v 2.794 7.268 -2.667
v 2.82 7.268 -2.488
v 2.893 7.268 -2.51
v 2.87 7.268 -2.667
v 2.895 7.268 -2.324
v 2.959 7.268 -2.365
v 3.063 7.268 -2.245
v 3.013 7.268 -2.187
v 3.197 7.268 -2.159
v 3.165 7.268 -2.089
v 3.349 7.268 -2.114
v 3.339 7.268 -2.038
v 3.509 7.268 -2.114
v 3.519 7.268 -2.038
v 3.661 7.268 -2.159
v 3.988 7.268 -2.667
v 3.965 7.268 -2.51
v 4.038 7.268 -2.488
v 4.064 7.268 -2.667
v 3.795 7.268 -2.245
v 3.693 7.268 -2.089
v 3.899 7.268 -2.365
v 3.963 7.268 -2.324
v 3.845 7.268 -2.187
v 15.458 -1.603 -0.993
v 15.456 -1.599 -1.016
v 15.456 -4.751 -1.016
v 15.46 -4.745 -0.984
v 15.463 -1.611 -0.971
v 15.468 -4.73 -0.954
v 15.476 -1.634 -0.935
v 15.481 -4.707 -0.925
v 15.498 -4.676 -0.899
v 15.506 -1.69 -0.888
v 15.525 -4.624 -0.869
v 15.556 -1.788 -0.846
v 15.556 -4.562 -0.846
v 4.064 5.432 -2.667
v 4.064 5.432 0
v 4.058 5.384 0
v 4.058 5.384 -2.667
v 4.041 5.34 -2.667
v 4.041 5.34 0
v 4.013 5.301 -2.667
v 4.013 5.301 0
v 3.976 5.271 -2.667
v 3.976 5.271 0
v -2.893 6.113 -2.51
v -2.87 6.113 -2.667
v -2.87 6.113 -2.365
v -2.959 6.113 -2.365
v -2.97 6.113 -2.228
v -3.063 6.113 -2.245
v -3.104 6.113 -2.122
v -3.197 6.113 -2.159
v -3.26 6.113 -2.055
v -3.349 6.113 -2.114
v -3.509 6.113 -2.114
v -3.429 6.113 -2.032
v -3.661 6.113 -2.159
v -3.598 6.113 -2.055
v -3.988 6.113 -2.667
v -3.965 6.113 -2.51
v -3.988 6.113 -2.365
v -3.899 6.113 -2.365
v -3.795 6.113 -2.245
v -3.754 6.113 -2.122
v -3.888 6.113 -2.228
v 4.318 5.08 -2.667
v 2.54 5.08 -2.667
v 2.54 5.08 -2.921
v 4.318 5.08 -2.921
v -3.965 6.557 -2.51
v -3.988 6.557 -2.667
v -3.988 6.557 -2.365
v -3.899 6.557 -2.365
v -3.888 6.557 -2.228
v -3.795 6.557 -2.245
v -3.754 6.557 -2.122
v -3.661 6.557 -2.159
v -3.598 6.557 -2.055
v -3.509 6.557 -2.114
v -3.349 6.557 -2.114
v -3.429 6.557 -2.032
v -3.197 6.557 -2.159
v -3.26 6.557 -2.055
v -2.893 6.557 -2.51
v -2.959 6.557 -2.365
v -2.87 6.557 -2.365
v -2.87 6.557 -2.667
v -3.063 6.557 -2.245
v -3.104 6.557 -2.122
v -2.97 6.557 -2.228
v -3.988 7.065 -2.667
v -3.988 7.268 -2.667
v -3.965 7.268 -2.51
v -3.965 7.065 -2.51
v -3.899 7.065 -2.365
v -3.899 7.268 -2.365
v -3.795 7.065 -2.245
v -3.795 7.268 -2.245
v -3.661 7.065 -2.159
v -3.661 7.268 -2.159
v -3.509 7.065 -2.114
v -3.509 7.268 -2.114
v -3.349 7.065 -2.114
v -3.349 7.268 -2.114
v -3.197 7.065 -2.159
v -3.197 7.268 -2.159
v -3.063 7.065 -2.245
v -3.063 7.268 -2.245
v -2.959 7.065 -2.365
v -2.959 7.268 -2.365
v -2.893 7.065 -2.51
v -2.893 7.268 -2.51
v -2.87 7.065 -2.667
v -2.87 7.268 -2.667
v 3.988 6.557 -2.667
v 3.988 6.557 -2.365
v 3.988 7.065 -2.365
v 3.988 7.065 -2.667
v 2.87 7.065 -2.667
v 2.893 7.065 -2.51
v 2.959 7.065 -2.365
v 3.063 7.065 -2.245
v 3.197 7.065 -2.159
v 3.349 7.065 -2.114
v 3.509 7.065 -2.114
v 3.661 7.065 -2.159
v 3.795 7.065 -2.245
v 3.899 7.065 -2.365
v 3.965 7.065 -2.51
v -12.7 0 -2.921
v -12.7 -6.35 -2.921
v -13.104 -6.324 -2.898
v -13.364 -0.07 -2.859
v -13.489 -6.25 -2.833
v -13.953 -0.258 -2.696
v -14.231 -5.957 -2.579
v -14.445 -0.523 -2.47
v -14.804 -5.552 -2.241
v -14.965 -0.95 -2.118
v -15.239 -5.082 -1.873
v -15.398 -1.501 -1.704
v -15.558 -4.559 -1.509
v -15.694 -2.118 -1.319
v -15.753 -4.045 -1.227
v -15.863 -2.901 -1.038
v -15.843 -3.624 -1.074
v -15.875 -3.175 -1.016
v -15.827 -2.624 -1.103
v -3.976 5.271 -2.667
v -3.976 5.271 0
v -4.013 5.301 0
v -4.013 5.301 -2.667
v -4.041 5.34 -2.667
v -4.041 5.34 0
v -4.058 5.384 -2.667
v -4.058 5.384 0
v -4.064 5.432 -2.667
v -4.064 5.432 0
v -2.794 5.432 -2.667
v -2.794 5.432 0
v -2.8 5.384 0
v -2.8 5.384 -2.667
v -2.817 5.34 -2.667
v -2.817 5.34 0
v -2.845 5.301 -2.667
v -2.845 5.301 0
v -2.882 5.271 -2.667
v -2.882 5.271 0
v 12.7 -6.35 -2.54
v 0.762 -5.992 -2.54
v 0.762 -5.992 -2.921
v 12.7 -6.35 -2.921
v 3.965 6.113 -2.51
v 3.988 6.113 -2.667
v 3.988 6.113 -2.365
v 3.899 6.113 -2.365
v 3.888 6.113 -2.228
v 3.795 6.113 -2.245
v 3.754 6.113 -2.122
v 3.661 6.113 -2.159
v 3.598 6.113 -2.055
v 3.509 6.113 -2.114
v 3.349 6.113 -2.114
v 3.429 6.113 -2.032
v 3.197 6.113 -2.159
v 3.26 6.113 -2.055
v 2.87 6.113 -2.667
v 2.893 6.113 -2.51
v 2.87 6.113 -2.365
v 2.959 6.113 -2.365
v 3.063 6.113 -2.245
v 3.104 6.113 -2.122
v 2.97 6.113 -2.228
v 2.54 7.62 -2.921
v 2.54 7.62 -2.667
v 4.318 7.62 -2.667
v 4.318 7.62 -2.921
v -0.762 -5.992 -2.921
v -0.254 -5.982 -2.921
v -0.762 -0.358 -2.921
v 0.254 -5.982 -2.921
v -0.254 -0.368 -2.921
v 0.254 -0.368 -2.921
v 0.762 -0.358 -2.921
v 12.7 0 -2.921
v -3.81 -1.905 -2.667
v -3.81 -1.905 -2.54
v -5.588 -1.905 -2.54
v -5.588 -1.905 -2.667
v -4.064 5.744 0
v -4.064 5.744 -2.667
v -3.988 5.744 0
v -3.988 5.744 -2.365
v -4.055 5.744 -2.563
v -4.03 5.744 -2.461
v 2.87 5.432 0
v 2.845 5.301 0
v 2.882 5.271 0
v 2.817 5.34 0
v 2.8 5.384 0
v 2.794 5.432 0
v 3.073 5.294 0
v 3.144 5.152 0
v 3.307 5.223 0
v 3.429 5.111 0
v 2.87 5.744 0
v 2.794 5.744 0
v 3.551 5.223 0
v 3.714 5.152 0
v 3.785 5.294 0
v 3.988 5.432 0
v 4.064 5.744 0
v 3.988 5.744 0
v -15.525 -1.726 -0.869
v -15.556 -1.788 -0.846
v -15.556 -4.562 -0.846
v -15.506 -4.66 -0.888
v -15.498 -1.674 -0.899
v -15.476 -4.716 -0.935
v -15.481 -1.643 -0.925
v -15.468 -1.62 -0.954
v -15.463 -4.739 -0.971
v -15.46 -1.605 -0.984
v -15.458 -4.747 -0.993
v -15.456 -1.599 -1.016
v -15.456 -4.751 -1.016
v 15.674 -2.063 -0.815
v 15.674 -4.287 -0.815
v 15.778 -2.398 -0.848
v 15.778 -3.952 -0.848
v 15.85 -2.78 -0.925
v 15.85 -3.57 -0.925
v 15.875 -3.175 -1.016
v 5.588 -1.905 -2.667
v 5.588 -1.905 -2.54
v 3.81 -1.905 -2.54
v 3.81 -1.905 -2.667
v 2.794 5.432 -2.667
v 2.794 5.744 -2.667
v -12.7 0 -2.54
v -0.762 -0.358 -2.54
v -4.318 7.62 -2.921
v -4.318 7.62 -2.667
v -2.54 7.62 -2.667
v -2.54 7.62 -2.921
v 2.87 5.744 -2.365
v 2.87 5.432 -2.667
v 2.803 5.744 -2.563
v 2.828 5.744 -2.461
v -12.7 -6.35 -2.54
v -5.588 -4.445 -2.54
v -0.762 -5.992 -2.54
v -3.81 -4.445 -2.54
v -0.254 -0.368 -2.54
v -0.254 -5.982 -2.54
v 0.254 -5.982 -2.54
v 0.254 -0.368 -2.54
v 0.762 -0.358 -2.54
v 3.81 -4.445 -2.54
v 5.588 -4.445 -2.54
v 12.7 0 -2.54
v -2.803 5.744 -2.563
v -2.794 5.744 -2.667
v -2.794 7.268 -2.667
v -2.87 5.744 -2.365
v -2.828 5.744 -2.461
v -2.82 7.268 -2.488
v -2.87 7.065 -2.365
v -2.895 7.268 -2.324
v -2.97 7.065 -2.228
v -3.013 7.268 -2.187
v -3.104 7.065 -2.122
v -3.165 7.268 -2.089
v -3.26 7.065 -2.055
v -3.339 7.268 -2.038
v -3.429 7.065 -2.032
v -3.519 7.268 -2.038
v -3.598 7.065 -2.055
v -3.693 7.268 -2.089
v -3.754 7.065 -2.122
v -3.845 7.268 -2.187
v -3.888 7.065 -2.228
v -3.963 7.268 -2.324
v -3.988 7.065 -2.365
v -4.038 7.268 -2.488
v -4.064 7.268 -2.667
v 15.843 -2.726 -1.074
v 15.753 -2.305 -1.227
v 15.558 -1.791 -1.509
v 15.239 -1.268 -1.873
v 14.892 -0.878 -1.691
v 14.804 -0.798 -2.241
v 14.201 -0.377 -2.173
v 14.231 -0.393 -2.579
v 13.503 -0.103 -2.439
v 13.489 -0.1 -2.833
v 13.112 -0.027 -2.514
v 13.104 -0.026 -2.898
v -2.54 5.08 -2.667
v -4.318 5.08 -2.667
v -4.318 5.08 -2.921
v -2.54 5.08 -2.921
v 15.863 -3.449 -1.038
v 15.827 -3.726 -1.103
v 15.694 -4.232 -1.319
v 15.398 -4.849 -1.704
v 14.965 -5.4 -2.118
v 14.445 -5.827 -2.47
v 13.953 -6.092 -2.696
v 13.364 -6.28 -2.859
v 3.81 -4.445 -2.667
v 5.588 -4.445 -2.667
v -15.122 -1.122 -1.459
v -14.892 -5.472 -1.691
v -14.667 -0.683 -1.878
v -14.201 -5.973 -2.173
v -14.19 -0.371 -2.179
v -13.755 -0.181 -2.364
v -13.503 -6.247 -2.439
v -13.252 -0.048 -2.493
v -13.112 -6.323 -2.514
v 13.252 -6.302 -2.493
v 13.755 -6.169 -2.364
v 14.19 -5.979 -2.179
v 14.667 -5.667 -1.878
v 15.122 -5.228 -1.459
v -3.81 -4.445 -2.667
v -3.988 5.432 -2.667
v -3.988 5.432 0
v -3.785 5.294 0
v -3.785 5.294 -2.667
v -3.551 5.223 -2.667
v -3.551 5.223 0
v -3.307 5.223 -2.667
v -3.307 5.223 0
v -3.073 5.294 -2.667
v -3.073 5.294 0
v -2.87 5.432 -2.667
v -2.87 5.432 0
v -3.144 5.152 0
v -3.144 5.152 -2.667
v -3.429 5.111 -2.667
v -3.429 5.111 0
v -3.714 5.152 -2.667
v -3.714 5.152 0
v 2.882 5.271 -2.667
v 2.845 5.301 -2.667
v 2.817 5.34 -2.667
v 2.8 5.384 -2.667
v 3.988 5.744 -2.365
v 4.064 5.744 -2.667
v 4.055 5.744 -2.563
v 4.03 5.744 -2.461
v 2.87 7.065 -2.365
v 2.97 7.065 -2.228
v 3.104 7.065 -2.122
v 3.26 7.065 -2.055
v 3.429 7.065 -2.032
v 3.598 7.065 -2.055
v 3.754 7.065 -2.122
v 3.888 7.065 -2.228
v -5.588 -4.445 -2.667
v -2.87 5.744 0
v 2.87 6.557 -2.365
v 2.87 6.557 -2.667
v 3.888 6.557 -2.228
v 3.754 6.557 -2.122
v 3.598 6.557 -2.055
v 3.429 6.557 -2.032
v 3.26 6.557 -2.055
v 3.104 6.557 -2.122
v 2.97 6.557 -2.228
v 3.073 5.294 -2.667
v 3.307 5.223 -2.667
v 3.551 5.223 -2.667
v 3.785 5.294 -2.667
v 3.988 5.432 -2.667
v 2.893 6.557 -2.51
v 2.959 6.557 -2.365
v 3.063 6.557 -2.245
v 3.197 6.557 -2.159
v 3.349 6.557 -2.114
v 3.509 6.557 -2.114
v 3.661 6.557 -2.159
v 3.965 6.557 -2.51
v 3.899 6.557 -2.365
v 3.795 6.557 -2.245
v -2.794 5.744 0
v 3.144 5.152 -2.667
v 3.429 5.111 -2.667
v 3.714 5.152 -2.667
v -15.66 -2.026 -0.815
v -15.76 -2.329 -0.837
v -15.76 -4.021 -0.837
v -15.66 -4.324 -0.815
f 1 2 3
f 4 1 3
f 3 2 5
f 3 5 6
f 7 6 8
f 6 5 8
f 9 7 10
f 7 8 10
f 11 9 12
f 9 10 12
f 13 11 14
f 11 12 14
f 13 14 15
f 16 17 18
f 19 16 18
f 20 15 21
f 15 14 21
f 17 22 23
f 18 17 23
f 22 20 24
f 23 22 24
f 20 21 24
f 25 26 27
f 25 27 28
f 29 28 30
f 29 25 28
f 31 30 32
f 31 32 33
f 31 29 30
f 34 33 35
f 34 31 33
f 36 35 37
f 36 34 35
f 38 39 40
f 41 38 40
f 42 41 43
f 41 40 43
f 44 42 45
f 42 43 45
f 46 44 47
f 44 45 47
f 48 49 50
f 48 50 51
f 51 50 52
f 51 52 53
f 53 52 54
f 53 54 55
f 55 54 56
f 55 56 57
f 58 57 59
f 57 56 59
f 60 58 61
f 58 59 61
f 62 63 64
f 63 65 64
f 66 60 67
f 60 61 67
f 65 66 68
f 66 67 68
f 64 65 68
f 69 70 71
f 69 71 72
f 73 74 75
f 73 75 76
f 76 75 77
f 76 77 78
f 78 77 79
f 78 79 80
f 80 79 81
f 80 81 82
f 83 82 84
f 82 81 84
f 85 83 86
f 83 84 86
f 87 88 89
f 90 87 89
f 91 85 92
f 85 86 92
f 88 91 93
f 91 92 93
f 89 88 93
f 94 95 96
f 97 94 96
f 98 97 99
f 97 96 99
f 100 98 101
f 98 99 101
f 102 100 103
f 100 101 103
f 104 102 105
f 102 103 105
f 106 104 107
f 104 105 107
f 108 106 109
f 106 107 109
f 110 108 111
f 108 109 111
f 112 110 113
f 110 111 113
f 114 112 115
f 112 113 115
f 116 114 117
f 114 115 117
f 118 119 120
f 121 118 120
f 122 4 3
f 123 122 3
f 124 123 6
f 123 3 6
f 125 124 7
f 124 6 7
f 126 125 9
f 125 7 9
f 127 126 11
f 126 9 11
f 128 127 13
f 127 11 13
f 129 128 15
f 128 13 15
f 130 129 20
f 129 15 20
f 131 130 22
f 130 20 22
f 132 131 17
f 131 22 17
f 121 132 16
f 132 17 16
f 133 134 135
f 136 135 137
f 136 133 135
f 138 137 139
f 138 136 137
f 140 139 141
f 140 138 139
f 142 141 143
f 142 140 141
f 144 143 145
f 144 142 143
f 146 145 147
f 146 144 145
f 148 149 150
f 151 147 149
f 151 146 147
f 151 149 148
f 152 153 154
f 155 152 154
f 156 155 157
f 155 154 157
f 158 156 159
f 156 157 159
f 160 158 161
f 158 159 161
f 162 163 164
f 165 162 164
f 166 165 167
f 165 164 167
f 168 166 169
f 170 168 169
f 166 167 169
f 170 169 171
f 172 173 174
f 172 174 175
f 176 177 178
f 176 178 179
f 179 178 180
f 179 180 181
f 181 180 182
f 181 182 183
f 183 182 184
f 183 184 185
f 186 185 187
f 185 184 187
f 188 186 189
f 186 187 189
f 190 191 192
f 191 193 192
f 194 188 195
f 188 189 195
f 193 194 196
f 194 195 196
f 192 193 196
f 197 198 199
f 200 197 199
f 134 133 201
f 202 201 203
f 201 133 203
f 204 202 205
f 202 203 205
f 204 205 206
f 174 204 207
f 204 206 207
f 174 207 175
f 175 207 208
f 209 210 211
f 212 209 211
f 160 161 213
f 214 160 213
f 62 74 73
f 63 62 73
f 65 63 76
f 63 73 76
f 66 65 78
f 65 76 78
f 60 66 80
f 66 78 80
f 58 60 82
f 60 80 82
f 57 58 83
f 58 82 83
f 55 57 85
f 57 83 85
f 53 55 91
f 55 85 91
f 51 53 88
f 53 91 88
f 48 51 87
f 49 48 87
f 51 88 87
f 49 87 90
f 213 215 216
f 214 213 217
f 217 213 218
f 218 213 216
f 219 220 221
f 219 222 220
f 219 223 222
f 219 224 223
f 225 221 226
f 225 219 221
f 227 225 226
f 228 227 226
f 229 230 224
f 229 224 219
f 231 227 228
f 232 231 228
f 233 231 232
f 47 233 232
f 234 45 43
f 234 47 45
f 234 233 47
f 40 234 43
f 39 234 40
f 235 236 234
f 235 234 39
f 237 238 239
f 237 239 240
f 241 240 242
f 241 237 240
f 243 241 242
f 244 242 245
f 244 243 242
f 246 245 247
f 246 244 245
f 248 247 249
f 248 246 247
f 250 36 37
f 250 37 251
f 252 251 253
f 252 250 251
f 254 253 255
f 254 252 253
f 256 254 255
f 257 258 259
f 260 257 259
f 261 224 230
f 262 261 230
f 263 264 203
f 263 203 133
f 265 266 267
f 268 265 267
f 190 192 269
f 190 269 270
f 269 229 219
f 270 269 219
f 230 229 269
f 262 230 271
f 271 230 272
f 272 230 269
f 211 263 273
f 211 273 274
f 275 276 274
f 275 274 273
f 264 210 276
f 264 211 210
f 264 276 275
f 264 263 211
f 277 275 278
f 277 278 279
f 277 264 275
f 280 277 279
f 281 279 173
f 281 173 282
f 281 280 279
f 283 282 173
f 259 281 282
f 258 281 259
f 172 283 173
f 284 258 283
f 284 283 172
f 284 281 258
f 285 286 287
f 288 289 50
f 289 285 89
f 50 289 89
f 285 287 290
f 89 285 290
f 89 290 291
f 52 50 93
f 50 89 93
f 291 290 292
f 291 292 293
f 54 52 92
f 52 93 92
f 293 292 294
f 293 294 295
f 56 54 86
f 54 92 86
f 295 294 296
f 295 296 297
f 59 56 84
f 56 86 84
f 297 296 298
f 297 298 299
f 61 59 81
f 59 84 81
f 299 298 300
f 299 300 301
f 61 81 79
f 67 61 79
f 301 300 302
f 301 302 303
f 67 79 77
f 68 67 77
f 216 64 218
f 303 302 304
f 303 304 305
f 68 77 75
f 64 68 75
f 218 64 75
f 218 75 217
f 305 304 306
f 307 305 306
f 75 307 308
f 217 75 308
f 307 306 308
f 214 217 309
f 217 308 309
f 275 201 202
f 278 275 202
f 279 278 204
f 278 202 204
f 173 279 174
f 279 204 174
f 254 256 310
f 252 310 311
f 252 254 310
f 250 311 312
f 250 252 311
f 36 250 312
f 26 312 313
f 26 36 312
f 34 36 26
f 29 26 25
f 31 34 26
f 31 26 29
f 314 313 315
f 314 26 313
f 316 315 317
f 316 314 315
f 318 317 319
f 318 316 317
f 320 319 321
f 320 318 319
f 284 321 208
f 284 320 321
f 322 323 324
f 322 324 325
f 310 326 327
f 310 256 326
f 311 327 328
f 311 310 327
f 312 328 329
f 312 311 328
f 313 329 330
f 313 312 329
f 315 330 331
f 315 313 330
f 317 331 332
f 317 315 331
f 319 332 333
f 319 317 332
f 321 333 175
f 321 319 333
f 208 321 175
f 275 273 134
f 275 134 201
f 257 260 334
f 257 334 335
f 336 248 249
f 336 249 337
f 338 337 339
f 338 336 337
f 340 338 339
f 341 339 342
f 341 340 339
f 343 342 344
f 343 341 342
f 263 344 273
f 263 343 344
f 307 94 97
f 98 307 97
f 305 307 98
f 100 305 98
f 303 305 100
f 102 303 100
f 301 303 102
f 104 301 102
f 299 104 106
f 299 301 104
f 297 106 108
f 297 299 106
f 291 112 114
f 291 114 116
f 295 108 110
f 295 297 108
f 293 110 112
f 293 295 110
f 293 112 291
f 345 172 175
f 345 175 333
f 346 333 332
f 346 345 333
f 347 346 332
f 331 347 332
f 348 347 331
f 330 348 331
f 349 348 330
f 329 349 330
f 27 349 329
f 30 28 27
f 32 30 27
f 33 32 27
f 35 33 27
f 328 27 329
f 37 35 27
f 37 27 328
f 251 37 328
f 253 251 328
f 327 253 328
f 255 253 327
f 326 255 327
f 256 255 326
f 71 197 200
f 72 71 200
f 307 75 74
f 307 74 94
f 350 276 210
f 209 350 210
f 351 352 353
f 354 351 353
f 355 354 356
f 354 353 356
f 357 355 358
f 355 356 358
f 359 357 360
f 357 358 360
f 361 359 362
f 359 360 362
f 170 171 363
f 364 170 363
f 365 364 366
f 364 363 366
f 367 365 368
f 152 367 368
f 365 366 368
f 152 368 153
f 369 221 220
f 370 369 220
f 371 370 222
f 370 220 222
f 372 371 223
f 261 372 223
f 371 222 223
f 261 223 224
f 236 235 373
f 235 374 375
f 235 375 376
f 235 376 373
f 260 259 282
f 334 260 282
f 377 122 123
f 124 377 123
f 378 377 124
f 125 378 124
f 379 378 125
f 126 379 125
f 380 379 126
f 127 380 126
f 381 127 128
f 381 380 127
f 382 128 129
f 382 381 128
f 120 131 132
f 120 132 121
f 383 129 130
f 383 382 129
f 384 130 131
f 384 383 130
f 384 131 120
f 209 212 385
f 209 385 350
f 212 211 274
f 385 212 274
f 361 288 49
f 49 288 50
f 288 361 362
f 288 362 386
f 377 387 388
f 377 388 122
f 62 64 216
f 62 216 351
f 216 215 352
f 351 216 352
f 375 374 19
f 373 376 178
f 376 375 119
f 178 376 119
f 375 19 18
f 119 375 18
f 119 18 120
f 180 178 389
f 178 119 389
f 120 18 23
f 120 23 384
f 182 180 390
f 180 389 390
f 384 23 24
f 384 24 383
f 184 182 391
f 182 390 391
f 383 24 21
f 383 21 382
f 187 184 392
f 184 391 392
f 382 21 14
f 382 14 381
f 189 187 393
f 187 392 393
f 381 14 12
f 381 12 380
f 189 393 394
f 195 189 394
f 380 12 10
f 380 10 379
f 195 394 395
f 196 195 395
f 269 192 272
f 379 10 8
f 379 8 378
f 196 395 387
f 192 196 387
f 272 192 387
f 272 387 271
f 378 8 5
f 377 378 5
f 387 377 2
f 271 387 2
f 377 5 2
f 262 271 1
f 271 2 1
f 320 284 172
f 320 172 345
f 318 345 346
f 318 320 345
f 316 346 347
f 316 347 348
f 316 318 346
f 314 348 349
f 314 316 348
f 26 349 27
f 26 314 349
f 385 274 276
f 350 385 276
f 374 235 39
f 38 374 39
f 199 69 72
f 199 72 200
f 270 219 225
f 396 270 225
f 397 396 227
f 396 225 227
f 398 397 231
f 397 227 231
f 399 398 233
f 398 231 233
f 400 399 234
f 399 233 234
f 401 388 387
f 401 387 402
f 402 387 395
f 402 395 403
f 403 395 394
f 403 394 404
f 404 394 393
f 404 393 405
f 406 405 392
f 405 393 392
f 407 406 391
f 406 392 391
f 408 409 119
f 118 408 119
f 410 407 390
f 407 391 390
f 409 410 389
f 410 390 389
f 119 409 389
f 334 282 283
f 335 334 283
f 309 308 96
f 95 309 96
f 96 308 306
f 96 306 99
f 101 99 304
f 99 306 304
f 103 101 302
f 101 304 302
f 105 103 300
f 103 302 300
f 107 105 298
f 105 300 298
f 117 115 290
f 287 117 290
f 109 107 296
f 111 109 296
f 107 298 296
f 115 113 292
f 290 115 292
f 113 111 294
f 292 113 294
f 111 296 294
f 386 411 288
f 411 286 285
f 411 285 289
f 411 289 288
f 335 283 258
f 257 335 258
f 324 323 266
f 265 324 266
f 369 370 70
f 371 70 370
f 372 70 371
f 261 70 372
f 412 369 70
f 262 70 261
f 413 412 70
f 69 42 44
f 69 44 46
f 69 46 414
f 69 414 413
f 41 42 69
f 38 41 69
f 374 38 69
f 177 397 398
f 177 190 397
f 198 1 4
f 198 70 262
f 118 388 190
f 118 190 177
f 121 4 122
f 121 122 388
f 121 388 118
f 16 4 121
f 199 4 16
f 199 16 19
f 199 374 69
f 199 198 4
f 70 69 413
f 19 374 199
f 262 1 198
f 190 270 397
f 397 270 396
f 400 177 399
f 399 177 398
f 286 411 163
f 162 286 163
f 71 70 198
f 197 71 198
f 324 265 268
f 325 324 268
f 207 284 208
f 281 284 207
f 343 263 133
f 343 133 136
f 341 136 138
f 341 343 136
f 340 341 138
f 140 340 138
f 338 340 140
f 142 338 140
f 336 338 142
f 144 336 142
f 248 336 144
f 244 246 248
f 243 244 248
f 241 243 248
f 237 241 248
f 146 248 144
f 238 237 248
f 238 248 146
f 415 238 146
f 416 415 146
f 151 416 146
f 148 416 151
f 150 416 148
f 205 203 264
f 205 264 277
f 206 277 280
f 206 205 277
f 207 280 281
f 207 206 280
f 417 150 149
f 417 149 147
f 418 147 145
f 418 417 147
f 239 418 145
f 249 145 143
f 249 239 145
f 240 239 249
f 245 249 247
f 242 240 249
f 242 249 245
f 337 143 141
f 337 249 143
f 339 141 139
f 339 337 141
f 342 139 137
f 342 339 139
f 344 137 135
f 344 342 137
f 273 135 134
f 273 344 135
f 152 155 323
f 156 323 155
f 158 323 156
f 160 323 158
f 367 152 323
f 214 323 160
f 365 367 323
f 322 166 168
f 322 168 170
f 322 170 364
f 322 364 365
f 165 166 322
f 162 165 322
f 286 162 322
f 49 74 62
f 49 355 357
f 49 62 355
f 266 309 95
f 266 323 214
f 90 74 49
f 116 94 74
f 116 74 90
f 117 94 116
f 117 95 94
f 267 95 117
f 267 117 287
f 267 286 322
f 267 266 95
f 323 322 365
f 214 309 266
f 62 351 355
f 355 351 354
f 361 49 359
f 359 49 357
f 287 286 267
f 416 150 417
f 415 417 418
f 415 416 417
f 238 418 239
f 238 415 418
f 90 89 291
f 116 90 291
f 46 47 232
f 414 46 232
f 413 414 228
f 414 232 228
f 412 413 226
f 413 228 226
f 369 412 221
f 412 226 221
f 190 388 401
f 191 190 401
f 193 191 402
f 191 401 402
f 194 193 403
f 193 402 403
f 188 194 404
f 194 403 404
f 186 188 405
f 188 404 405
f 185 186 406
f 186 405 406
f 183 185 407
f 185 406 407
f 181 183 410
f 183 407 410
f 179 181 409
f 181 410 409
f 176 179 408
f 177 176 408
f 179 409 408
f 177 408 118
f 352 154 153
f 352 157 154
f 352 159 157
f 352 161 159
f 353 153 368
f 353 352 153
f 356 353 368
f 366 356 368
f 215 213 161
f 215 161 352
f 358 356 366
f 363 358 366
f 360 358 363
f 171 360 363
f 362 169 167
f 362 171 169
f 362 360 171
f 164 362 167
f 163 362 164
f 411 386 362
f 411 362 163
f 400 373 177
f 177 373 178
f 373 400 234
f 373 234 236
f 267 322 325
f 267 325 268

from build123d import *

# Parameters (mm, degrees)
F1_DEPTH    = 9.8425
F3_DEPTH    = 25.4
F5_DEPTH    = 2.667
F6_T1_DEPTH = 0.381
F0_W        = 1.778
F0_H        = 2.54
F0_W_2      = 1.1176
F0_H_2      = 0.508
F0_H_3      = 0.4445
F0_H_4      = 0.2032
F0_W_3      = 0.0762
F0_H_5      = 0.6812858045
F7_DEPTH    = 2.921
F8_DEPTH    = 2.667
F9_DEPTH    = 2.667
F12_DEPTH   = 1.524


# Not quite as in the source:
# - a fillet or chamfer that OpenCascade refuses, or shapes differently, is made with other operations: its cross-section is extruded or revolved along the edge and cut away or added


with BuildPart() as f1:
    # F0 (on Top) → F1 (new body)
    with BuildSketch(Plane.XY):
        with BuildLine():
            Line((-12.7, -6.35), (-12.7, 0))
            ThreePointArc((-12.7, 0), (-15.875, -3.175), (-12.7, -6.35))
        make_face()
        with BuildLine():
            ThreePointArc((12.7, -6.35), (15.875, -3.175), (12.7, 0))
            Line((12.7, 0), (12.7, -6.35))
        make_face()
        Polygon((-6.35, -0.1905), (-12.7, 0), (-12.7, -6.35), (-6.35, -6.1595), (0, -5.969), (6.35, -6.1595), (12.7, -6.35), (12.7, 0), (6.35, -0.1905), (0, -0.381), align=None)
    extrude(amount=-F1_DEPTH)

    # F2 (on Front) → F3 (cut)
    with BuildSketch(Plane.XZ):
        with BuildLine():
            Line((-12.7, -2.54), (0, -2.54))
            Line((0, -2.54), (12.7, -2.54))
            ThreePointArc((12.7, -2.54), (14.2747487895, -2.1336283165), (15.4562218706, -1.016))
            ThreePointArc((15.4562218706, -1.016), (15.4848358871, -0.9182319253), (15.5561717457, -0.8455094828))
            ThreePointArc((15.5561717457, -0.8455094828), (15.745074667, -0.4338744994), (15.875, 0))
            Line((15.875, 0), (-15.875, 0))
            ThreePointArc((-15.875, 0), (-15.7450242413, -0.4340082159), (-15.556034737, -0.8457603215))
            ThreePointArc((-15.556034737, -0.8457603215), (-15.484834563, -0.9183954726), (-15.4562218706, -1.016))
            ThreePointArc((-15.4562218706, -1.016), (-14.2747487895, -2.1336283165), (-12.7, -2.54))
        make_face()
        with BuildLine():
            ThreePointArc((-15.875, -1.016), (-15.7642823045, -0.8395129732), (-15.556034737, -0.8457603215))
            ThreePointArc((-15.556034737, -0.8457603215), (-15.7450242413, -0.4340082159), (-15.875, 0))
            Line((-15.875, 0), (-15.875, -1.016))
        make_face()
        with BuildLine():
            ThreePointArc((-12.7, -2.921), (-14.5513272266, -2.4082120444), (-15.875, -1.016))
            Line((-15.875, -1.016), (-15.875, -9.8425))
            Line((-15.875, -9.8425), (15.875, -9.8425))
            Line((15.875, -9.8425), (15.875, -1.016))
            ThreePointArc((15.875, -1.016), (14.5513272266, -2.4082120444), (12.7, -2.921))
            Line((12.7, -2.921), (0, -2.921))
            Line((0, -2.921), (-12.7, -2.921))
        make_face()
        with BuildLine():
            ThreePointArc((15.875, 0), (15.745074667, -0.4338744994), (15.5561717457, -0.8455094828))
            ThreePointArc((15.5561717457, -0.8455094828), (15.7644251473, -0.8394221507), (15.875, -1.016))
            Line((15.875, -1.016), (15.875, 0))
        make_face()
    extrude(amount=F3_DEPTH, mode=Mode.SUBTRACT)

    # F4 (on Top) → F5 (cut)
    with BuildSketch(Plane.XY):
        Polygon((-3.81, -4.445), (-3.81, -3.175), (-3.81, -1.905), (-5.588, -1.905), (-5.588, -4.445), align=None)
        Polygon((3.81, -1.905), (3.81, -3.175), (3.81, -4.445), (5.588, -4.445), (5.588, -1.905), align=None)
    extrude(amount=-F5_DEPTH, mode=Mode.SUBTRACT)

    # F6: fillet of radius 25.4 on 2 edges, made by hand

    # F6_s2 → F6_t1 (join)
    with BuildSketch(Plane.XY.offset(-2.921)):
        with BuildLine():
            ThreePointArc((-0.7616573313, -5.9918497199), (0, -5.9804274294), (0.7616573313, -5.9918497199))
            Line((0.7616573313, -5.9918497199), (0, -5.969))
            Line((0, -5.969), (-0.7616573313, -5.9918497199))
        make_face()
        with BuildLine():
            ThreePointArc((-0.7616573313, -0.3581502801), (0, -0.3695725706), (0.7616573313, -0.3581502801))
            Line((0.7616573313, -0.3581502801), (0, -0.381))
            Line((0, -0.381), (-0.7616573313, -0.3581502801))
        make_face()
    extrude(amount=F6_T1_DEPTH)


with BuildPart() as f7:
    # F0 (on Top) → F7 (new body)
    with BuildSketch(Plane.XY):
        with Locations((3.429, 6.35)):
            Rectangle(F0_W, F0_H)
        with BuildLine():
            Line((4.064, 6.1127929022), (4.064, 5.4315070978))
            ThreePointArc((4.064, 5.4315070978), (4.0405795527, 5.3399938579), (3.9760769231, 5.2709822559))
            ThreePointArc((3.9760769231, 5.2709822559), (3.429, 5.1111147458), (2.8819230769, 5.2709822559))
            ThreePointArc((2.8819230769, 5.2709822559), (2.8174204473, 5.3399938579), (2.794, 5.4315070978))
            Line((2.794, 5.4315070978), (2.794, 6.1127929022))
            Line((2.794, 6.1127929022), (2.794, 6.5572929022))
            Line((2.794, 6.5572929022), (2.794, 7.0652929022))
            Line((2.794, 7.0652929022), (2.794, 7.2684929022))
            ThreePointArc((2.794, 7.2684929022), (2.8174204473, 7.3600061421), (2.8819230769, 7.4290177441))
            ThreePointArc((2.8819230769, 7.4290177441), (3.429, 7.5888852542), (3.9760769231, 7.4290177441))
            ThreePointArc((3.9760769231, 7.4290177441), (4.0405795527, 7.3600061421), (4.064, 7.2684929022))
            Line((4.064, 7.2684929022), (4.064, 7.0652929022))
            Line((4.064, 7.0652929022), (4.064, 6.5572929022))
            Line((4.064, 6.5572929022), (4.064, 6.1127929022))
        make_face(mode=Mode.SUBTRACT)
        with BuildLine():
            ThreePointArc((2.8702, 5.4315070978), (3.429, 5.2136194824), (3.9878, 5.4315070978))
            Line((3.9878, 5.4315070978), (3.9878, 6.1127929022))
            Line((3.9878, 6.1127929022), (2.8702, 6.1127929022))
            Line((2.8702, 6.1127929022), (2.8702, 5.4315070978))
        make_face()
        with Locations((3.429, 6.8112929022)):
            Rectangle(F0_W_2, F0_H_2)
        with Locations((3.429, 6.3350429022)):
            Rectangle(F0_W_2, F0_H_3)
        with BuildLine():
            Line((3.9878, 7.2684929022), (4.064, 7.2684929022))
            ThreePointArc((4.064, 7.2684929022), (4.0405795527, 7.3600061421), (3.9760769231, 7.4290177441))
            ThreePointArc((3.9760769231, 7.4290177441), (3.429, 7.5888852542), (2.8819230769, 7.4290177441))
            ThreePointArc((2.8819230769, 7.4290177441), (2.8174204473, 7.3600061421), (2.794, 7.2684929022))
            Line((2.794, 7.2684929022), (2.8702, 7.2684929022))
            Line((2.8702, 7.2684929022), (3.9878, 7.2684929022))
        make_face()
        with Locations((3.429, 7.1668929022)):
            Rectangle(F0_W_2, F0_H_4)
        with BuildLine():
            ThreePointArc((3.9760769231, 5.2709822559), (4.0405795527, 5.3399938579), (4.064, 5.4315070978))
            Line((4.064, 5.4315070978), (3.9878, 5.4315070978))
            ThreePointArc((3.9878, 5.4315070978), (3.429, 5.2136194824), (2.8702, 5.4315070978))
            Line((2.8702, 5.4315070978), (2.794, 5.4315070978))
            ThreePointArc((2.794, 5.4315070978), (2.8174204473, 5.3399938579), (2.8819230769, 5.2709822559))
            ThreePointArc((2.8819230769, 5.2709822559), (3.429, 5.1111147458), (3.9760769231, 5.2709822559))
        make_face()
        with Locations((4.0259, 5.77215)):
            Rectangle(F0_W_3, F0_H_5)
        with Locations((2.8321, 5.77215)):
            Rectangle(F0_W_3, F0_H_5)
        with Locations((2.8321, 6.8112929022)):
            Rectangle(F0_W_3, F0_H_2)
        with Locations((4.0259, 6.8112929022)):
            Rectangle(F0_W_3, F0_H_2)
        with Locations((4.0259, 6.3350429022)):
            Rectangle(F0_W_3, F0_H_3)
        with Locations((2.8321, 6.3350429022)):
            Rectangle(F0_W_3, F0_H_3)
        with Locations((2.8321, 7.1668929022)):
            Rectangle(F0_W_3, F0_H_4)
        with Locations((4.0259, 7.1668929022)):
            Rectangle(F0_W_3, F0_H_4)
    extrude(amount=-F7_DEPTH)

    # F0 (on Top) → F9 (cut)
    with BuildSketch(Plane.XY):
        with Locations((3.429, 6.35)):
            Rectangle(F0_W, F0_H)
        with BuildLine():
            Line((4.064, 6.1127929022), (4.064, 5.4315070978))
            ThreePointArc((4.064, 5.4315070978), (4.0405795527, 5.3399938579), (3.9760769231, 5.2709822559))
            ThreePointArc((3.9760769231, 5.2709822559), (3.429, 5.1111147458), (2.8819230769, 5.2709822559))
            ThreePointArc((2.8819230769, 5.2709822559), (2.8174204473, 5.3399938579), (2.794, 5.4315070978))
            Line((2.794, 5.4315070978), (2.794, 6.1127929022))
            Line((2.794, 6.1127929022), (2.794, 6.5572929022))
            Line((2.794, 6.5572929022), (2.794, 7.0652929022))
            Line((2.794, 7.0652929022), (2.794, 7.2684929022))
            ThreePointArc((2.794, 7.2684929022), (2.8174204473, 7.3600061421), (2.8819230769, 7.4290177441))
            ThreePointArc((2.8819230769, 7.4290177441), (3.429, 7.5888852542), (3.9760769231, 7.4290177441))
            ThreePointArc((3.9760769231, 7.4290177441), (4.0405795527, 7.3600061421), (4.064, 7.2684929022))
            Line((4.064, 7.2684929022), (4.064, 7.0652929022))
            Line((4.064, 7.0652929022), (4.064, 6.5572929022))
            Line((4.064, 6.5572929022), (4.064, 6.1127929022))
        make_face(mode=Mode.SUBTRACT)
        with BuildLine():
            ThreePointArc((2.8702, 5.4315070978), (3.429, 5.2136194824), (3.9878, 5.4315070978))
            Line((3.9878, 5.4315070978), (3.9878, 6.1127929022))
            Line((3.9878, 6.1127929022), (2.8702, 6.1127929022))
            Line((2.8702, 6.1127929022), (2.8702, 5.4315070978))
        make_face()
        with Locations((3.429, 6.8112929022)):
            Rectangle(F0_W_2, F0_H_2)
        with BuildLine():
            Line((3.9878, 7.2684929022), (4.064, 7.2684929022))
            ThreePointArc((4.064, 7.2684929022), (4.0405795527, 7.3600061421), (3.9760769231, 7.4290177441))
            ThreePointArc((3.9760769231, 7.4290177441), (3.429, 7.5888852542), (2.8819230769, 7.4290177441))
            ThreePointArc((2.8819230769, 7.4290177441), (2.8174204473, 7.3600061421), (2.794, 7.2684929022))
            Line((2.794, 7.2684929022), (2.8702, 7.2684929022))
            Line((2.8702, 7.2684929022), (3.9878, 7.2684929022))
        make_face()
    extrude(amount=-F9_DEPTH, mode=Mode.SUBTRACT)


with BuildPart() as f7b:
    # F0 (on Top) → F7, piece 2 (new body)
    with BuildSketch(Plane.XY):
        with Locations((-3.429, 6.35)):
            Rectangle(F0_W, F0_H)
        with BuildLine():
            ThreePointArc((-2.8819230769, 5.2709822559), (-3.429, 5.1111147458), (-3.9760769231, 5.2709822559))
            ThreePointArc((-3.9760769231, 5.2709822559), (-4.0405795527, 5.3399938579), (-4.064, 5.4315070978))
            Line((-4.064, 5.4315070978), (-4.064, 6.1127929022))
            Line((-4.064, 6.1127929022), (-4.064, 6.5572929022))
            Line((-4.064, 6.5572929022), (-4.064, 7.0652929022))
            Line((-4.064, 7.0652929022), (-4.064, 7.2684929022))
            ThreePointArc((-4.064, 7.2684929022), (-4.0405795527, 7.3600061421), (-3.9760769231, 7.4290177441))
            ThreePointArc((-3.9760769231, 7.4290177441), (-3.429, 7.5888852542), (-2.8819230769, 7.4290177441))
            ThreePointArc((-2.8819230769, 7.4290177441), (-2.8174204473, 7.3600061421), (-2.794, 7.2684929022))
            Line((-2.794, 7.2684929022), (-2.794, 7.0652929022))
            Line((-2.794, 7.0652929022), (-2.794, 6.5572929022))
            Line((-2.794, 6.5572929022), (-2.794, 6.1127929022))
            Line((-2.794, 6.1127929022), (-2.794, 5.4315070978))
            ThreePointArc((-2.794, 5.4315070978), (-2.8174204473, 5.3399938579), (-2.8819230769, 5.2709822559))
        make_face(mode=Mode.SUBTRACT)
        with BuildLine():
            Line((-3.9878, 6.1127929022), (-3.9878, 5.4315070978))
            ThreePointArc((-3.9878, 5.4315070978), (-3.429, 5.2136194824), (-2.8702, 5.4315070978))
            Line((-2.8702, 5.4315070978), (-2.8702, 6.1127929022))
            Line((-2.8702, 6.1127929022), (-3.9878, 6.1127929022))
        make_face()
        with Locations((-3.429, 6.8112929022)):
            Rectangle(F0_W_2, F0_H_2)
        with Locations((-3.429, 6.3350429022)):
            Rectangle(F0_W_2, F0_H_3)
        with BuildLine():
            ThreePointArc((-3.9760769231, 7.4290177441), (-4.0405795527, 7.3600061421), (-4.064, 7.2684929022))
            Line((-4.064, 7.2684929022), (-3.9878, 7.2684929022))
            Line((-3.9878, 7.2684929022), (-2.8702, 7.2684929022))
            Line((-2.8702, 7.2684929022), (-2.794, 7.2684929022))
            ThreePointArc((-2.794, 7.2684929022), (-2.8174204473, 7.3600061421), (-2.8819230769, 7.4290177441))
            ThreePointArc((-2.8819230769, 7.4290177441), (-3.429, 7.5888852542), (-3.9760769231, 7.4290177441))
        make_face()
        with Locations((-3.429, 7.1668929022)):
            Rectangle(F0_W_2, F0_H_4)
        with BuildLine():
            ThreePointArc((-4.064, 5.4315070978), (-4.0405795527, 5.3399938579), (-3.9760769231, 5.2709822559))
            ThreePointArc((-3.9760769231, 5.2709822559), (-3.429, 5.1111147458), (-2.8819230769, 5.2709822559))
            ThreePointArc((-2.8819230769, 5.2709822559), (-2.8174204473, 5.3399938579), (-2.794, 5.4315070978))
            Line((-2.794, 5.4315070978), (-2.8702, 5.4315070978))
            ThreePointArc((-2.8702, 5.4315070978), (-3.429, 5.2136194824), (-3.9878, 5.4315070978))
            Line((-3.9878, 5.4315070978), (-4.064, 5.4315070978))
        make_face()
        with Locations((-4.0259, 5.77215)):
            Rectangle(F0_W_3, F0_H_5)
        with Locations((-2.8321, 5.77215)):
            Rectangle(F0_W_3, F0_H_5)
        with Locations((-2.8321, 6.8112929022)):
            Rectangle(F0_W_3, F0_H_2)
        with Locations((-4.0259, 6.8112929022)):
            Rectangle(F0_W_3, F0_H_2)
        with Locations((-4.0259, 6.3350429022)):
            Rectangle(F0_W_3, F0_H_3)
        with Locations((-2.8321, 6.3350429022)):
            Rectangle(F0_W_3, F0_H_3)
        with Locations((-4.0259, 7.1668929022)):
            Rectangle(F0_W_3, F0_H_4)
        with Locations((-2.8321, 7.1668929022)):
            Rectangle(F0_W_3, F0_H_4)
    extrude(amount=-F7_DEPTH)

    # F0 (on Top) → F8 (cut)
    with BuildSketch(Plane.XY):
        with Locations((-3.429, 6.35)):
            Rectangle(F0_W, F0_H)
        with BuildLine():
            ThreePointArc((-2.8819230769, 5.2709822559), (-3.429, 5.1111147458), (-3.9760769231, 5.2709822559))
            ThreePointArc((-3.9760769231, 5.2709822559), (-4.0405795527, 5.3399938579), (-4.064, 5.4315070978))
            Line((-4.064, 5.4315070978), (-4.064, 6.1127929022))
            Line((-4.064, 6.1127929022), (-4.064, 6.5572929022))
            Line((-4.064, 6.5572929022), (-4.064, 7.0652929022))
            Line((-4.064, 7.0652929022), (-4.064, 7.2684929022))
            ThreePointArc((-4.064, 7.2684929022), (-4.0405795527, 7.3600061421), (-3.9760769231, 7.4290177441))
            ThreePointArc((-3.9760769231, 7.4290177441), (-3.429, 7.5888852542), (-2.8819230769, 7.4290177441))
            ThreePointArc((-2.8819230769, 7.4290177441), (-2.8174204473, 7.3600061421), (-2.794, 7.2684929022))
            Line((-2.794, 7.2684929022), (-2.794, 7.0652929022))
            Line((-2.794, 7.0652929022), (-2.794, 6.5572929022))
            Line((-2.794, 6.5572929022), (-2.794, 6.1127929022))
            Line((-2.794, 6.1127929022), (-2.794, 5.4315070978))
            ThreePointArc((-2.794, 5.4315070978), (-2.8174204473, 5.3399938579), (-2.8819230769, 5.2709822559))
        make_face(mode=Mode.SUBTRACT)
        with BuildLine():
            Line((-3.9878, 6.1127929022), (-3.9878, 5.4315070978))
            ThreePointArc((-3.9878, 5.4315070978), (-3.429, 5.2136194824), (-2.8702, 5.4315070978))
            Line((-2.8702, 5.4315070978), (-2.8702, 6.1127929022))
            Line((-2.8702, 6.1127929022), (-3.9878, 6.1127929022))
        make_face()
        with Locations((-3.429, 6.8112929022)):
            Rectangle(F0_W_2, F0_H_2)
        with BuildLine():
            ThreePointArc((-3.9760769231, 7.4290177441), (-4.0405795527, 7.3600061421), (-4.064, 7.2684929022))
            Line((-4.064, 7.2684929022), (-3.9878, 7.2684929022))
            Line((-3.9878, 7.2684929022), (-2.8702, 7.2684929022))
            Line((-2.8702, 7.2684929022), (-2.794, 7.2684929022))
            ThreePointArc((-2.794, 7.2684929022), (-2.8174204473, 7.3600061421), (-2.8819230769, 7.4290177441))
            ThreePointArc((-2.8819230769, 7.4290177441), (-3.429, 7.5888852542), (-3.9760769231, 7.4290177441))
        make_face()
    extrude(amount=-F8_DEPTH, mode=Mode.SUBTRACT)


with BuildPart() as f12_tool:
    # F11 (on face) + F10 (on face) → F12 (new body)
    with BuildSketch(Plane(origin=(0, 7.2684929022, 0), x_dir=(-1, 0, 0), z_dir=(0, 1, 0))):
        with BuildLine():
            ThreePointArc((-2.8702, -2.667), (-3.429, -2.1082), (-3.9878, -2.667))
            Line((-3.9878, -2.667), (-2.8702, -2.667))
        make_face()
        with BuildLine():
            Line((-4.064, 0), (-4.064, -2.667))
            ThreePointArc((-4.064, -2.667), (-3.429, -2.032), (-2.794, -2.667))
            Line((-2.794, -2.667), (-2.794, 0))
            Line((-2.794, 0), (-4.064, 0))
        make_face()
    with BuildSketch(Plane(origin=(0, 7.2684929022, 0), x_dir=(-1, 0, 0), z_dir=(0, 1, 0))):
        with BuildLine():
            Line((2.8702, -2.667), (3.9878, -2.667))
            ThreePointArc((3.9878, -2.667), (3.429, -2.1082), (2.8702, -2.667))
        make_face()
        with BuildLine():
            ThreePointArc((2.794, -2.667), (3.429, -2.032), (4.064, -2.667))
            Line((4.064, -2.667), (4.064, 0))
            Line((4.064, 0), (2.794, 0))
            Line((2.794, 0), (2.794, -2.667))
        make_face()
    extrude(amount=-F12_DEPTH)


with BuildPart() as f7_1:
    add(f7.part)

    # F12: cut by f12_tool
    add(f12_tool.part, mode=Mode.SUBTRACT)


with BuildPart() as f7b_1:
    add(f7b.part)

    # F12: cut by f12_tool
    add(f12_tool.part, mode=Mode.SUBTRACT)


solid = Compound([f1.part, f7_1.part, f7b_1.part])
